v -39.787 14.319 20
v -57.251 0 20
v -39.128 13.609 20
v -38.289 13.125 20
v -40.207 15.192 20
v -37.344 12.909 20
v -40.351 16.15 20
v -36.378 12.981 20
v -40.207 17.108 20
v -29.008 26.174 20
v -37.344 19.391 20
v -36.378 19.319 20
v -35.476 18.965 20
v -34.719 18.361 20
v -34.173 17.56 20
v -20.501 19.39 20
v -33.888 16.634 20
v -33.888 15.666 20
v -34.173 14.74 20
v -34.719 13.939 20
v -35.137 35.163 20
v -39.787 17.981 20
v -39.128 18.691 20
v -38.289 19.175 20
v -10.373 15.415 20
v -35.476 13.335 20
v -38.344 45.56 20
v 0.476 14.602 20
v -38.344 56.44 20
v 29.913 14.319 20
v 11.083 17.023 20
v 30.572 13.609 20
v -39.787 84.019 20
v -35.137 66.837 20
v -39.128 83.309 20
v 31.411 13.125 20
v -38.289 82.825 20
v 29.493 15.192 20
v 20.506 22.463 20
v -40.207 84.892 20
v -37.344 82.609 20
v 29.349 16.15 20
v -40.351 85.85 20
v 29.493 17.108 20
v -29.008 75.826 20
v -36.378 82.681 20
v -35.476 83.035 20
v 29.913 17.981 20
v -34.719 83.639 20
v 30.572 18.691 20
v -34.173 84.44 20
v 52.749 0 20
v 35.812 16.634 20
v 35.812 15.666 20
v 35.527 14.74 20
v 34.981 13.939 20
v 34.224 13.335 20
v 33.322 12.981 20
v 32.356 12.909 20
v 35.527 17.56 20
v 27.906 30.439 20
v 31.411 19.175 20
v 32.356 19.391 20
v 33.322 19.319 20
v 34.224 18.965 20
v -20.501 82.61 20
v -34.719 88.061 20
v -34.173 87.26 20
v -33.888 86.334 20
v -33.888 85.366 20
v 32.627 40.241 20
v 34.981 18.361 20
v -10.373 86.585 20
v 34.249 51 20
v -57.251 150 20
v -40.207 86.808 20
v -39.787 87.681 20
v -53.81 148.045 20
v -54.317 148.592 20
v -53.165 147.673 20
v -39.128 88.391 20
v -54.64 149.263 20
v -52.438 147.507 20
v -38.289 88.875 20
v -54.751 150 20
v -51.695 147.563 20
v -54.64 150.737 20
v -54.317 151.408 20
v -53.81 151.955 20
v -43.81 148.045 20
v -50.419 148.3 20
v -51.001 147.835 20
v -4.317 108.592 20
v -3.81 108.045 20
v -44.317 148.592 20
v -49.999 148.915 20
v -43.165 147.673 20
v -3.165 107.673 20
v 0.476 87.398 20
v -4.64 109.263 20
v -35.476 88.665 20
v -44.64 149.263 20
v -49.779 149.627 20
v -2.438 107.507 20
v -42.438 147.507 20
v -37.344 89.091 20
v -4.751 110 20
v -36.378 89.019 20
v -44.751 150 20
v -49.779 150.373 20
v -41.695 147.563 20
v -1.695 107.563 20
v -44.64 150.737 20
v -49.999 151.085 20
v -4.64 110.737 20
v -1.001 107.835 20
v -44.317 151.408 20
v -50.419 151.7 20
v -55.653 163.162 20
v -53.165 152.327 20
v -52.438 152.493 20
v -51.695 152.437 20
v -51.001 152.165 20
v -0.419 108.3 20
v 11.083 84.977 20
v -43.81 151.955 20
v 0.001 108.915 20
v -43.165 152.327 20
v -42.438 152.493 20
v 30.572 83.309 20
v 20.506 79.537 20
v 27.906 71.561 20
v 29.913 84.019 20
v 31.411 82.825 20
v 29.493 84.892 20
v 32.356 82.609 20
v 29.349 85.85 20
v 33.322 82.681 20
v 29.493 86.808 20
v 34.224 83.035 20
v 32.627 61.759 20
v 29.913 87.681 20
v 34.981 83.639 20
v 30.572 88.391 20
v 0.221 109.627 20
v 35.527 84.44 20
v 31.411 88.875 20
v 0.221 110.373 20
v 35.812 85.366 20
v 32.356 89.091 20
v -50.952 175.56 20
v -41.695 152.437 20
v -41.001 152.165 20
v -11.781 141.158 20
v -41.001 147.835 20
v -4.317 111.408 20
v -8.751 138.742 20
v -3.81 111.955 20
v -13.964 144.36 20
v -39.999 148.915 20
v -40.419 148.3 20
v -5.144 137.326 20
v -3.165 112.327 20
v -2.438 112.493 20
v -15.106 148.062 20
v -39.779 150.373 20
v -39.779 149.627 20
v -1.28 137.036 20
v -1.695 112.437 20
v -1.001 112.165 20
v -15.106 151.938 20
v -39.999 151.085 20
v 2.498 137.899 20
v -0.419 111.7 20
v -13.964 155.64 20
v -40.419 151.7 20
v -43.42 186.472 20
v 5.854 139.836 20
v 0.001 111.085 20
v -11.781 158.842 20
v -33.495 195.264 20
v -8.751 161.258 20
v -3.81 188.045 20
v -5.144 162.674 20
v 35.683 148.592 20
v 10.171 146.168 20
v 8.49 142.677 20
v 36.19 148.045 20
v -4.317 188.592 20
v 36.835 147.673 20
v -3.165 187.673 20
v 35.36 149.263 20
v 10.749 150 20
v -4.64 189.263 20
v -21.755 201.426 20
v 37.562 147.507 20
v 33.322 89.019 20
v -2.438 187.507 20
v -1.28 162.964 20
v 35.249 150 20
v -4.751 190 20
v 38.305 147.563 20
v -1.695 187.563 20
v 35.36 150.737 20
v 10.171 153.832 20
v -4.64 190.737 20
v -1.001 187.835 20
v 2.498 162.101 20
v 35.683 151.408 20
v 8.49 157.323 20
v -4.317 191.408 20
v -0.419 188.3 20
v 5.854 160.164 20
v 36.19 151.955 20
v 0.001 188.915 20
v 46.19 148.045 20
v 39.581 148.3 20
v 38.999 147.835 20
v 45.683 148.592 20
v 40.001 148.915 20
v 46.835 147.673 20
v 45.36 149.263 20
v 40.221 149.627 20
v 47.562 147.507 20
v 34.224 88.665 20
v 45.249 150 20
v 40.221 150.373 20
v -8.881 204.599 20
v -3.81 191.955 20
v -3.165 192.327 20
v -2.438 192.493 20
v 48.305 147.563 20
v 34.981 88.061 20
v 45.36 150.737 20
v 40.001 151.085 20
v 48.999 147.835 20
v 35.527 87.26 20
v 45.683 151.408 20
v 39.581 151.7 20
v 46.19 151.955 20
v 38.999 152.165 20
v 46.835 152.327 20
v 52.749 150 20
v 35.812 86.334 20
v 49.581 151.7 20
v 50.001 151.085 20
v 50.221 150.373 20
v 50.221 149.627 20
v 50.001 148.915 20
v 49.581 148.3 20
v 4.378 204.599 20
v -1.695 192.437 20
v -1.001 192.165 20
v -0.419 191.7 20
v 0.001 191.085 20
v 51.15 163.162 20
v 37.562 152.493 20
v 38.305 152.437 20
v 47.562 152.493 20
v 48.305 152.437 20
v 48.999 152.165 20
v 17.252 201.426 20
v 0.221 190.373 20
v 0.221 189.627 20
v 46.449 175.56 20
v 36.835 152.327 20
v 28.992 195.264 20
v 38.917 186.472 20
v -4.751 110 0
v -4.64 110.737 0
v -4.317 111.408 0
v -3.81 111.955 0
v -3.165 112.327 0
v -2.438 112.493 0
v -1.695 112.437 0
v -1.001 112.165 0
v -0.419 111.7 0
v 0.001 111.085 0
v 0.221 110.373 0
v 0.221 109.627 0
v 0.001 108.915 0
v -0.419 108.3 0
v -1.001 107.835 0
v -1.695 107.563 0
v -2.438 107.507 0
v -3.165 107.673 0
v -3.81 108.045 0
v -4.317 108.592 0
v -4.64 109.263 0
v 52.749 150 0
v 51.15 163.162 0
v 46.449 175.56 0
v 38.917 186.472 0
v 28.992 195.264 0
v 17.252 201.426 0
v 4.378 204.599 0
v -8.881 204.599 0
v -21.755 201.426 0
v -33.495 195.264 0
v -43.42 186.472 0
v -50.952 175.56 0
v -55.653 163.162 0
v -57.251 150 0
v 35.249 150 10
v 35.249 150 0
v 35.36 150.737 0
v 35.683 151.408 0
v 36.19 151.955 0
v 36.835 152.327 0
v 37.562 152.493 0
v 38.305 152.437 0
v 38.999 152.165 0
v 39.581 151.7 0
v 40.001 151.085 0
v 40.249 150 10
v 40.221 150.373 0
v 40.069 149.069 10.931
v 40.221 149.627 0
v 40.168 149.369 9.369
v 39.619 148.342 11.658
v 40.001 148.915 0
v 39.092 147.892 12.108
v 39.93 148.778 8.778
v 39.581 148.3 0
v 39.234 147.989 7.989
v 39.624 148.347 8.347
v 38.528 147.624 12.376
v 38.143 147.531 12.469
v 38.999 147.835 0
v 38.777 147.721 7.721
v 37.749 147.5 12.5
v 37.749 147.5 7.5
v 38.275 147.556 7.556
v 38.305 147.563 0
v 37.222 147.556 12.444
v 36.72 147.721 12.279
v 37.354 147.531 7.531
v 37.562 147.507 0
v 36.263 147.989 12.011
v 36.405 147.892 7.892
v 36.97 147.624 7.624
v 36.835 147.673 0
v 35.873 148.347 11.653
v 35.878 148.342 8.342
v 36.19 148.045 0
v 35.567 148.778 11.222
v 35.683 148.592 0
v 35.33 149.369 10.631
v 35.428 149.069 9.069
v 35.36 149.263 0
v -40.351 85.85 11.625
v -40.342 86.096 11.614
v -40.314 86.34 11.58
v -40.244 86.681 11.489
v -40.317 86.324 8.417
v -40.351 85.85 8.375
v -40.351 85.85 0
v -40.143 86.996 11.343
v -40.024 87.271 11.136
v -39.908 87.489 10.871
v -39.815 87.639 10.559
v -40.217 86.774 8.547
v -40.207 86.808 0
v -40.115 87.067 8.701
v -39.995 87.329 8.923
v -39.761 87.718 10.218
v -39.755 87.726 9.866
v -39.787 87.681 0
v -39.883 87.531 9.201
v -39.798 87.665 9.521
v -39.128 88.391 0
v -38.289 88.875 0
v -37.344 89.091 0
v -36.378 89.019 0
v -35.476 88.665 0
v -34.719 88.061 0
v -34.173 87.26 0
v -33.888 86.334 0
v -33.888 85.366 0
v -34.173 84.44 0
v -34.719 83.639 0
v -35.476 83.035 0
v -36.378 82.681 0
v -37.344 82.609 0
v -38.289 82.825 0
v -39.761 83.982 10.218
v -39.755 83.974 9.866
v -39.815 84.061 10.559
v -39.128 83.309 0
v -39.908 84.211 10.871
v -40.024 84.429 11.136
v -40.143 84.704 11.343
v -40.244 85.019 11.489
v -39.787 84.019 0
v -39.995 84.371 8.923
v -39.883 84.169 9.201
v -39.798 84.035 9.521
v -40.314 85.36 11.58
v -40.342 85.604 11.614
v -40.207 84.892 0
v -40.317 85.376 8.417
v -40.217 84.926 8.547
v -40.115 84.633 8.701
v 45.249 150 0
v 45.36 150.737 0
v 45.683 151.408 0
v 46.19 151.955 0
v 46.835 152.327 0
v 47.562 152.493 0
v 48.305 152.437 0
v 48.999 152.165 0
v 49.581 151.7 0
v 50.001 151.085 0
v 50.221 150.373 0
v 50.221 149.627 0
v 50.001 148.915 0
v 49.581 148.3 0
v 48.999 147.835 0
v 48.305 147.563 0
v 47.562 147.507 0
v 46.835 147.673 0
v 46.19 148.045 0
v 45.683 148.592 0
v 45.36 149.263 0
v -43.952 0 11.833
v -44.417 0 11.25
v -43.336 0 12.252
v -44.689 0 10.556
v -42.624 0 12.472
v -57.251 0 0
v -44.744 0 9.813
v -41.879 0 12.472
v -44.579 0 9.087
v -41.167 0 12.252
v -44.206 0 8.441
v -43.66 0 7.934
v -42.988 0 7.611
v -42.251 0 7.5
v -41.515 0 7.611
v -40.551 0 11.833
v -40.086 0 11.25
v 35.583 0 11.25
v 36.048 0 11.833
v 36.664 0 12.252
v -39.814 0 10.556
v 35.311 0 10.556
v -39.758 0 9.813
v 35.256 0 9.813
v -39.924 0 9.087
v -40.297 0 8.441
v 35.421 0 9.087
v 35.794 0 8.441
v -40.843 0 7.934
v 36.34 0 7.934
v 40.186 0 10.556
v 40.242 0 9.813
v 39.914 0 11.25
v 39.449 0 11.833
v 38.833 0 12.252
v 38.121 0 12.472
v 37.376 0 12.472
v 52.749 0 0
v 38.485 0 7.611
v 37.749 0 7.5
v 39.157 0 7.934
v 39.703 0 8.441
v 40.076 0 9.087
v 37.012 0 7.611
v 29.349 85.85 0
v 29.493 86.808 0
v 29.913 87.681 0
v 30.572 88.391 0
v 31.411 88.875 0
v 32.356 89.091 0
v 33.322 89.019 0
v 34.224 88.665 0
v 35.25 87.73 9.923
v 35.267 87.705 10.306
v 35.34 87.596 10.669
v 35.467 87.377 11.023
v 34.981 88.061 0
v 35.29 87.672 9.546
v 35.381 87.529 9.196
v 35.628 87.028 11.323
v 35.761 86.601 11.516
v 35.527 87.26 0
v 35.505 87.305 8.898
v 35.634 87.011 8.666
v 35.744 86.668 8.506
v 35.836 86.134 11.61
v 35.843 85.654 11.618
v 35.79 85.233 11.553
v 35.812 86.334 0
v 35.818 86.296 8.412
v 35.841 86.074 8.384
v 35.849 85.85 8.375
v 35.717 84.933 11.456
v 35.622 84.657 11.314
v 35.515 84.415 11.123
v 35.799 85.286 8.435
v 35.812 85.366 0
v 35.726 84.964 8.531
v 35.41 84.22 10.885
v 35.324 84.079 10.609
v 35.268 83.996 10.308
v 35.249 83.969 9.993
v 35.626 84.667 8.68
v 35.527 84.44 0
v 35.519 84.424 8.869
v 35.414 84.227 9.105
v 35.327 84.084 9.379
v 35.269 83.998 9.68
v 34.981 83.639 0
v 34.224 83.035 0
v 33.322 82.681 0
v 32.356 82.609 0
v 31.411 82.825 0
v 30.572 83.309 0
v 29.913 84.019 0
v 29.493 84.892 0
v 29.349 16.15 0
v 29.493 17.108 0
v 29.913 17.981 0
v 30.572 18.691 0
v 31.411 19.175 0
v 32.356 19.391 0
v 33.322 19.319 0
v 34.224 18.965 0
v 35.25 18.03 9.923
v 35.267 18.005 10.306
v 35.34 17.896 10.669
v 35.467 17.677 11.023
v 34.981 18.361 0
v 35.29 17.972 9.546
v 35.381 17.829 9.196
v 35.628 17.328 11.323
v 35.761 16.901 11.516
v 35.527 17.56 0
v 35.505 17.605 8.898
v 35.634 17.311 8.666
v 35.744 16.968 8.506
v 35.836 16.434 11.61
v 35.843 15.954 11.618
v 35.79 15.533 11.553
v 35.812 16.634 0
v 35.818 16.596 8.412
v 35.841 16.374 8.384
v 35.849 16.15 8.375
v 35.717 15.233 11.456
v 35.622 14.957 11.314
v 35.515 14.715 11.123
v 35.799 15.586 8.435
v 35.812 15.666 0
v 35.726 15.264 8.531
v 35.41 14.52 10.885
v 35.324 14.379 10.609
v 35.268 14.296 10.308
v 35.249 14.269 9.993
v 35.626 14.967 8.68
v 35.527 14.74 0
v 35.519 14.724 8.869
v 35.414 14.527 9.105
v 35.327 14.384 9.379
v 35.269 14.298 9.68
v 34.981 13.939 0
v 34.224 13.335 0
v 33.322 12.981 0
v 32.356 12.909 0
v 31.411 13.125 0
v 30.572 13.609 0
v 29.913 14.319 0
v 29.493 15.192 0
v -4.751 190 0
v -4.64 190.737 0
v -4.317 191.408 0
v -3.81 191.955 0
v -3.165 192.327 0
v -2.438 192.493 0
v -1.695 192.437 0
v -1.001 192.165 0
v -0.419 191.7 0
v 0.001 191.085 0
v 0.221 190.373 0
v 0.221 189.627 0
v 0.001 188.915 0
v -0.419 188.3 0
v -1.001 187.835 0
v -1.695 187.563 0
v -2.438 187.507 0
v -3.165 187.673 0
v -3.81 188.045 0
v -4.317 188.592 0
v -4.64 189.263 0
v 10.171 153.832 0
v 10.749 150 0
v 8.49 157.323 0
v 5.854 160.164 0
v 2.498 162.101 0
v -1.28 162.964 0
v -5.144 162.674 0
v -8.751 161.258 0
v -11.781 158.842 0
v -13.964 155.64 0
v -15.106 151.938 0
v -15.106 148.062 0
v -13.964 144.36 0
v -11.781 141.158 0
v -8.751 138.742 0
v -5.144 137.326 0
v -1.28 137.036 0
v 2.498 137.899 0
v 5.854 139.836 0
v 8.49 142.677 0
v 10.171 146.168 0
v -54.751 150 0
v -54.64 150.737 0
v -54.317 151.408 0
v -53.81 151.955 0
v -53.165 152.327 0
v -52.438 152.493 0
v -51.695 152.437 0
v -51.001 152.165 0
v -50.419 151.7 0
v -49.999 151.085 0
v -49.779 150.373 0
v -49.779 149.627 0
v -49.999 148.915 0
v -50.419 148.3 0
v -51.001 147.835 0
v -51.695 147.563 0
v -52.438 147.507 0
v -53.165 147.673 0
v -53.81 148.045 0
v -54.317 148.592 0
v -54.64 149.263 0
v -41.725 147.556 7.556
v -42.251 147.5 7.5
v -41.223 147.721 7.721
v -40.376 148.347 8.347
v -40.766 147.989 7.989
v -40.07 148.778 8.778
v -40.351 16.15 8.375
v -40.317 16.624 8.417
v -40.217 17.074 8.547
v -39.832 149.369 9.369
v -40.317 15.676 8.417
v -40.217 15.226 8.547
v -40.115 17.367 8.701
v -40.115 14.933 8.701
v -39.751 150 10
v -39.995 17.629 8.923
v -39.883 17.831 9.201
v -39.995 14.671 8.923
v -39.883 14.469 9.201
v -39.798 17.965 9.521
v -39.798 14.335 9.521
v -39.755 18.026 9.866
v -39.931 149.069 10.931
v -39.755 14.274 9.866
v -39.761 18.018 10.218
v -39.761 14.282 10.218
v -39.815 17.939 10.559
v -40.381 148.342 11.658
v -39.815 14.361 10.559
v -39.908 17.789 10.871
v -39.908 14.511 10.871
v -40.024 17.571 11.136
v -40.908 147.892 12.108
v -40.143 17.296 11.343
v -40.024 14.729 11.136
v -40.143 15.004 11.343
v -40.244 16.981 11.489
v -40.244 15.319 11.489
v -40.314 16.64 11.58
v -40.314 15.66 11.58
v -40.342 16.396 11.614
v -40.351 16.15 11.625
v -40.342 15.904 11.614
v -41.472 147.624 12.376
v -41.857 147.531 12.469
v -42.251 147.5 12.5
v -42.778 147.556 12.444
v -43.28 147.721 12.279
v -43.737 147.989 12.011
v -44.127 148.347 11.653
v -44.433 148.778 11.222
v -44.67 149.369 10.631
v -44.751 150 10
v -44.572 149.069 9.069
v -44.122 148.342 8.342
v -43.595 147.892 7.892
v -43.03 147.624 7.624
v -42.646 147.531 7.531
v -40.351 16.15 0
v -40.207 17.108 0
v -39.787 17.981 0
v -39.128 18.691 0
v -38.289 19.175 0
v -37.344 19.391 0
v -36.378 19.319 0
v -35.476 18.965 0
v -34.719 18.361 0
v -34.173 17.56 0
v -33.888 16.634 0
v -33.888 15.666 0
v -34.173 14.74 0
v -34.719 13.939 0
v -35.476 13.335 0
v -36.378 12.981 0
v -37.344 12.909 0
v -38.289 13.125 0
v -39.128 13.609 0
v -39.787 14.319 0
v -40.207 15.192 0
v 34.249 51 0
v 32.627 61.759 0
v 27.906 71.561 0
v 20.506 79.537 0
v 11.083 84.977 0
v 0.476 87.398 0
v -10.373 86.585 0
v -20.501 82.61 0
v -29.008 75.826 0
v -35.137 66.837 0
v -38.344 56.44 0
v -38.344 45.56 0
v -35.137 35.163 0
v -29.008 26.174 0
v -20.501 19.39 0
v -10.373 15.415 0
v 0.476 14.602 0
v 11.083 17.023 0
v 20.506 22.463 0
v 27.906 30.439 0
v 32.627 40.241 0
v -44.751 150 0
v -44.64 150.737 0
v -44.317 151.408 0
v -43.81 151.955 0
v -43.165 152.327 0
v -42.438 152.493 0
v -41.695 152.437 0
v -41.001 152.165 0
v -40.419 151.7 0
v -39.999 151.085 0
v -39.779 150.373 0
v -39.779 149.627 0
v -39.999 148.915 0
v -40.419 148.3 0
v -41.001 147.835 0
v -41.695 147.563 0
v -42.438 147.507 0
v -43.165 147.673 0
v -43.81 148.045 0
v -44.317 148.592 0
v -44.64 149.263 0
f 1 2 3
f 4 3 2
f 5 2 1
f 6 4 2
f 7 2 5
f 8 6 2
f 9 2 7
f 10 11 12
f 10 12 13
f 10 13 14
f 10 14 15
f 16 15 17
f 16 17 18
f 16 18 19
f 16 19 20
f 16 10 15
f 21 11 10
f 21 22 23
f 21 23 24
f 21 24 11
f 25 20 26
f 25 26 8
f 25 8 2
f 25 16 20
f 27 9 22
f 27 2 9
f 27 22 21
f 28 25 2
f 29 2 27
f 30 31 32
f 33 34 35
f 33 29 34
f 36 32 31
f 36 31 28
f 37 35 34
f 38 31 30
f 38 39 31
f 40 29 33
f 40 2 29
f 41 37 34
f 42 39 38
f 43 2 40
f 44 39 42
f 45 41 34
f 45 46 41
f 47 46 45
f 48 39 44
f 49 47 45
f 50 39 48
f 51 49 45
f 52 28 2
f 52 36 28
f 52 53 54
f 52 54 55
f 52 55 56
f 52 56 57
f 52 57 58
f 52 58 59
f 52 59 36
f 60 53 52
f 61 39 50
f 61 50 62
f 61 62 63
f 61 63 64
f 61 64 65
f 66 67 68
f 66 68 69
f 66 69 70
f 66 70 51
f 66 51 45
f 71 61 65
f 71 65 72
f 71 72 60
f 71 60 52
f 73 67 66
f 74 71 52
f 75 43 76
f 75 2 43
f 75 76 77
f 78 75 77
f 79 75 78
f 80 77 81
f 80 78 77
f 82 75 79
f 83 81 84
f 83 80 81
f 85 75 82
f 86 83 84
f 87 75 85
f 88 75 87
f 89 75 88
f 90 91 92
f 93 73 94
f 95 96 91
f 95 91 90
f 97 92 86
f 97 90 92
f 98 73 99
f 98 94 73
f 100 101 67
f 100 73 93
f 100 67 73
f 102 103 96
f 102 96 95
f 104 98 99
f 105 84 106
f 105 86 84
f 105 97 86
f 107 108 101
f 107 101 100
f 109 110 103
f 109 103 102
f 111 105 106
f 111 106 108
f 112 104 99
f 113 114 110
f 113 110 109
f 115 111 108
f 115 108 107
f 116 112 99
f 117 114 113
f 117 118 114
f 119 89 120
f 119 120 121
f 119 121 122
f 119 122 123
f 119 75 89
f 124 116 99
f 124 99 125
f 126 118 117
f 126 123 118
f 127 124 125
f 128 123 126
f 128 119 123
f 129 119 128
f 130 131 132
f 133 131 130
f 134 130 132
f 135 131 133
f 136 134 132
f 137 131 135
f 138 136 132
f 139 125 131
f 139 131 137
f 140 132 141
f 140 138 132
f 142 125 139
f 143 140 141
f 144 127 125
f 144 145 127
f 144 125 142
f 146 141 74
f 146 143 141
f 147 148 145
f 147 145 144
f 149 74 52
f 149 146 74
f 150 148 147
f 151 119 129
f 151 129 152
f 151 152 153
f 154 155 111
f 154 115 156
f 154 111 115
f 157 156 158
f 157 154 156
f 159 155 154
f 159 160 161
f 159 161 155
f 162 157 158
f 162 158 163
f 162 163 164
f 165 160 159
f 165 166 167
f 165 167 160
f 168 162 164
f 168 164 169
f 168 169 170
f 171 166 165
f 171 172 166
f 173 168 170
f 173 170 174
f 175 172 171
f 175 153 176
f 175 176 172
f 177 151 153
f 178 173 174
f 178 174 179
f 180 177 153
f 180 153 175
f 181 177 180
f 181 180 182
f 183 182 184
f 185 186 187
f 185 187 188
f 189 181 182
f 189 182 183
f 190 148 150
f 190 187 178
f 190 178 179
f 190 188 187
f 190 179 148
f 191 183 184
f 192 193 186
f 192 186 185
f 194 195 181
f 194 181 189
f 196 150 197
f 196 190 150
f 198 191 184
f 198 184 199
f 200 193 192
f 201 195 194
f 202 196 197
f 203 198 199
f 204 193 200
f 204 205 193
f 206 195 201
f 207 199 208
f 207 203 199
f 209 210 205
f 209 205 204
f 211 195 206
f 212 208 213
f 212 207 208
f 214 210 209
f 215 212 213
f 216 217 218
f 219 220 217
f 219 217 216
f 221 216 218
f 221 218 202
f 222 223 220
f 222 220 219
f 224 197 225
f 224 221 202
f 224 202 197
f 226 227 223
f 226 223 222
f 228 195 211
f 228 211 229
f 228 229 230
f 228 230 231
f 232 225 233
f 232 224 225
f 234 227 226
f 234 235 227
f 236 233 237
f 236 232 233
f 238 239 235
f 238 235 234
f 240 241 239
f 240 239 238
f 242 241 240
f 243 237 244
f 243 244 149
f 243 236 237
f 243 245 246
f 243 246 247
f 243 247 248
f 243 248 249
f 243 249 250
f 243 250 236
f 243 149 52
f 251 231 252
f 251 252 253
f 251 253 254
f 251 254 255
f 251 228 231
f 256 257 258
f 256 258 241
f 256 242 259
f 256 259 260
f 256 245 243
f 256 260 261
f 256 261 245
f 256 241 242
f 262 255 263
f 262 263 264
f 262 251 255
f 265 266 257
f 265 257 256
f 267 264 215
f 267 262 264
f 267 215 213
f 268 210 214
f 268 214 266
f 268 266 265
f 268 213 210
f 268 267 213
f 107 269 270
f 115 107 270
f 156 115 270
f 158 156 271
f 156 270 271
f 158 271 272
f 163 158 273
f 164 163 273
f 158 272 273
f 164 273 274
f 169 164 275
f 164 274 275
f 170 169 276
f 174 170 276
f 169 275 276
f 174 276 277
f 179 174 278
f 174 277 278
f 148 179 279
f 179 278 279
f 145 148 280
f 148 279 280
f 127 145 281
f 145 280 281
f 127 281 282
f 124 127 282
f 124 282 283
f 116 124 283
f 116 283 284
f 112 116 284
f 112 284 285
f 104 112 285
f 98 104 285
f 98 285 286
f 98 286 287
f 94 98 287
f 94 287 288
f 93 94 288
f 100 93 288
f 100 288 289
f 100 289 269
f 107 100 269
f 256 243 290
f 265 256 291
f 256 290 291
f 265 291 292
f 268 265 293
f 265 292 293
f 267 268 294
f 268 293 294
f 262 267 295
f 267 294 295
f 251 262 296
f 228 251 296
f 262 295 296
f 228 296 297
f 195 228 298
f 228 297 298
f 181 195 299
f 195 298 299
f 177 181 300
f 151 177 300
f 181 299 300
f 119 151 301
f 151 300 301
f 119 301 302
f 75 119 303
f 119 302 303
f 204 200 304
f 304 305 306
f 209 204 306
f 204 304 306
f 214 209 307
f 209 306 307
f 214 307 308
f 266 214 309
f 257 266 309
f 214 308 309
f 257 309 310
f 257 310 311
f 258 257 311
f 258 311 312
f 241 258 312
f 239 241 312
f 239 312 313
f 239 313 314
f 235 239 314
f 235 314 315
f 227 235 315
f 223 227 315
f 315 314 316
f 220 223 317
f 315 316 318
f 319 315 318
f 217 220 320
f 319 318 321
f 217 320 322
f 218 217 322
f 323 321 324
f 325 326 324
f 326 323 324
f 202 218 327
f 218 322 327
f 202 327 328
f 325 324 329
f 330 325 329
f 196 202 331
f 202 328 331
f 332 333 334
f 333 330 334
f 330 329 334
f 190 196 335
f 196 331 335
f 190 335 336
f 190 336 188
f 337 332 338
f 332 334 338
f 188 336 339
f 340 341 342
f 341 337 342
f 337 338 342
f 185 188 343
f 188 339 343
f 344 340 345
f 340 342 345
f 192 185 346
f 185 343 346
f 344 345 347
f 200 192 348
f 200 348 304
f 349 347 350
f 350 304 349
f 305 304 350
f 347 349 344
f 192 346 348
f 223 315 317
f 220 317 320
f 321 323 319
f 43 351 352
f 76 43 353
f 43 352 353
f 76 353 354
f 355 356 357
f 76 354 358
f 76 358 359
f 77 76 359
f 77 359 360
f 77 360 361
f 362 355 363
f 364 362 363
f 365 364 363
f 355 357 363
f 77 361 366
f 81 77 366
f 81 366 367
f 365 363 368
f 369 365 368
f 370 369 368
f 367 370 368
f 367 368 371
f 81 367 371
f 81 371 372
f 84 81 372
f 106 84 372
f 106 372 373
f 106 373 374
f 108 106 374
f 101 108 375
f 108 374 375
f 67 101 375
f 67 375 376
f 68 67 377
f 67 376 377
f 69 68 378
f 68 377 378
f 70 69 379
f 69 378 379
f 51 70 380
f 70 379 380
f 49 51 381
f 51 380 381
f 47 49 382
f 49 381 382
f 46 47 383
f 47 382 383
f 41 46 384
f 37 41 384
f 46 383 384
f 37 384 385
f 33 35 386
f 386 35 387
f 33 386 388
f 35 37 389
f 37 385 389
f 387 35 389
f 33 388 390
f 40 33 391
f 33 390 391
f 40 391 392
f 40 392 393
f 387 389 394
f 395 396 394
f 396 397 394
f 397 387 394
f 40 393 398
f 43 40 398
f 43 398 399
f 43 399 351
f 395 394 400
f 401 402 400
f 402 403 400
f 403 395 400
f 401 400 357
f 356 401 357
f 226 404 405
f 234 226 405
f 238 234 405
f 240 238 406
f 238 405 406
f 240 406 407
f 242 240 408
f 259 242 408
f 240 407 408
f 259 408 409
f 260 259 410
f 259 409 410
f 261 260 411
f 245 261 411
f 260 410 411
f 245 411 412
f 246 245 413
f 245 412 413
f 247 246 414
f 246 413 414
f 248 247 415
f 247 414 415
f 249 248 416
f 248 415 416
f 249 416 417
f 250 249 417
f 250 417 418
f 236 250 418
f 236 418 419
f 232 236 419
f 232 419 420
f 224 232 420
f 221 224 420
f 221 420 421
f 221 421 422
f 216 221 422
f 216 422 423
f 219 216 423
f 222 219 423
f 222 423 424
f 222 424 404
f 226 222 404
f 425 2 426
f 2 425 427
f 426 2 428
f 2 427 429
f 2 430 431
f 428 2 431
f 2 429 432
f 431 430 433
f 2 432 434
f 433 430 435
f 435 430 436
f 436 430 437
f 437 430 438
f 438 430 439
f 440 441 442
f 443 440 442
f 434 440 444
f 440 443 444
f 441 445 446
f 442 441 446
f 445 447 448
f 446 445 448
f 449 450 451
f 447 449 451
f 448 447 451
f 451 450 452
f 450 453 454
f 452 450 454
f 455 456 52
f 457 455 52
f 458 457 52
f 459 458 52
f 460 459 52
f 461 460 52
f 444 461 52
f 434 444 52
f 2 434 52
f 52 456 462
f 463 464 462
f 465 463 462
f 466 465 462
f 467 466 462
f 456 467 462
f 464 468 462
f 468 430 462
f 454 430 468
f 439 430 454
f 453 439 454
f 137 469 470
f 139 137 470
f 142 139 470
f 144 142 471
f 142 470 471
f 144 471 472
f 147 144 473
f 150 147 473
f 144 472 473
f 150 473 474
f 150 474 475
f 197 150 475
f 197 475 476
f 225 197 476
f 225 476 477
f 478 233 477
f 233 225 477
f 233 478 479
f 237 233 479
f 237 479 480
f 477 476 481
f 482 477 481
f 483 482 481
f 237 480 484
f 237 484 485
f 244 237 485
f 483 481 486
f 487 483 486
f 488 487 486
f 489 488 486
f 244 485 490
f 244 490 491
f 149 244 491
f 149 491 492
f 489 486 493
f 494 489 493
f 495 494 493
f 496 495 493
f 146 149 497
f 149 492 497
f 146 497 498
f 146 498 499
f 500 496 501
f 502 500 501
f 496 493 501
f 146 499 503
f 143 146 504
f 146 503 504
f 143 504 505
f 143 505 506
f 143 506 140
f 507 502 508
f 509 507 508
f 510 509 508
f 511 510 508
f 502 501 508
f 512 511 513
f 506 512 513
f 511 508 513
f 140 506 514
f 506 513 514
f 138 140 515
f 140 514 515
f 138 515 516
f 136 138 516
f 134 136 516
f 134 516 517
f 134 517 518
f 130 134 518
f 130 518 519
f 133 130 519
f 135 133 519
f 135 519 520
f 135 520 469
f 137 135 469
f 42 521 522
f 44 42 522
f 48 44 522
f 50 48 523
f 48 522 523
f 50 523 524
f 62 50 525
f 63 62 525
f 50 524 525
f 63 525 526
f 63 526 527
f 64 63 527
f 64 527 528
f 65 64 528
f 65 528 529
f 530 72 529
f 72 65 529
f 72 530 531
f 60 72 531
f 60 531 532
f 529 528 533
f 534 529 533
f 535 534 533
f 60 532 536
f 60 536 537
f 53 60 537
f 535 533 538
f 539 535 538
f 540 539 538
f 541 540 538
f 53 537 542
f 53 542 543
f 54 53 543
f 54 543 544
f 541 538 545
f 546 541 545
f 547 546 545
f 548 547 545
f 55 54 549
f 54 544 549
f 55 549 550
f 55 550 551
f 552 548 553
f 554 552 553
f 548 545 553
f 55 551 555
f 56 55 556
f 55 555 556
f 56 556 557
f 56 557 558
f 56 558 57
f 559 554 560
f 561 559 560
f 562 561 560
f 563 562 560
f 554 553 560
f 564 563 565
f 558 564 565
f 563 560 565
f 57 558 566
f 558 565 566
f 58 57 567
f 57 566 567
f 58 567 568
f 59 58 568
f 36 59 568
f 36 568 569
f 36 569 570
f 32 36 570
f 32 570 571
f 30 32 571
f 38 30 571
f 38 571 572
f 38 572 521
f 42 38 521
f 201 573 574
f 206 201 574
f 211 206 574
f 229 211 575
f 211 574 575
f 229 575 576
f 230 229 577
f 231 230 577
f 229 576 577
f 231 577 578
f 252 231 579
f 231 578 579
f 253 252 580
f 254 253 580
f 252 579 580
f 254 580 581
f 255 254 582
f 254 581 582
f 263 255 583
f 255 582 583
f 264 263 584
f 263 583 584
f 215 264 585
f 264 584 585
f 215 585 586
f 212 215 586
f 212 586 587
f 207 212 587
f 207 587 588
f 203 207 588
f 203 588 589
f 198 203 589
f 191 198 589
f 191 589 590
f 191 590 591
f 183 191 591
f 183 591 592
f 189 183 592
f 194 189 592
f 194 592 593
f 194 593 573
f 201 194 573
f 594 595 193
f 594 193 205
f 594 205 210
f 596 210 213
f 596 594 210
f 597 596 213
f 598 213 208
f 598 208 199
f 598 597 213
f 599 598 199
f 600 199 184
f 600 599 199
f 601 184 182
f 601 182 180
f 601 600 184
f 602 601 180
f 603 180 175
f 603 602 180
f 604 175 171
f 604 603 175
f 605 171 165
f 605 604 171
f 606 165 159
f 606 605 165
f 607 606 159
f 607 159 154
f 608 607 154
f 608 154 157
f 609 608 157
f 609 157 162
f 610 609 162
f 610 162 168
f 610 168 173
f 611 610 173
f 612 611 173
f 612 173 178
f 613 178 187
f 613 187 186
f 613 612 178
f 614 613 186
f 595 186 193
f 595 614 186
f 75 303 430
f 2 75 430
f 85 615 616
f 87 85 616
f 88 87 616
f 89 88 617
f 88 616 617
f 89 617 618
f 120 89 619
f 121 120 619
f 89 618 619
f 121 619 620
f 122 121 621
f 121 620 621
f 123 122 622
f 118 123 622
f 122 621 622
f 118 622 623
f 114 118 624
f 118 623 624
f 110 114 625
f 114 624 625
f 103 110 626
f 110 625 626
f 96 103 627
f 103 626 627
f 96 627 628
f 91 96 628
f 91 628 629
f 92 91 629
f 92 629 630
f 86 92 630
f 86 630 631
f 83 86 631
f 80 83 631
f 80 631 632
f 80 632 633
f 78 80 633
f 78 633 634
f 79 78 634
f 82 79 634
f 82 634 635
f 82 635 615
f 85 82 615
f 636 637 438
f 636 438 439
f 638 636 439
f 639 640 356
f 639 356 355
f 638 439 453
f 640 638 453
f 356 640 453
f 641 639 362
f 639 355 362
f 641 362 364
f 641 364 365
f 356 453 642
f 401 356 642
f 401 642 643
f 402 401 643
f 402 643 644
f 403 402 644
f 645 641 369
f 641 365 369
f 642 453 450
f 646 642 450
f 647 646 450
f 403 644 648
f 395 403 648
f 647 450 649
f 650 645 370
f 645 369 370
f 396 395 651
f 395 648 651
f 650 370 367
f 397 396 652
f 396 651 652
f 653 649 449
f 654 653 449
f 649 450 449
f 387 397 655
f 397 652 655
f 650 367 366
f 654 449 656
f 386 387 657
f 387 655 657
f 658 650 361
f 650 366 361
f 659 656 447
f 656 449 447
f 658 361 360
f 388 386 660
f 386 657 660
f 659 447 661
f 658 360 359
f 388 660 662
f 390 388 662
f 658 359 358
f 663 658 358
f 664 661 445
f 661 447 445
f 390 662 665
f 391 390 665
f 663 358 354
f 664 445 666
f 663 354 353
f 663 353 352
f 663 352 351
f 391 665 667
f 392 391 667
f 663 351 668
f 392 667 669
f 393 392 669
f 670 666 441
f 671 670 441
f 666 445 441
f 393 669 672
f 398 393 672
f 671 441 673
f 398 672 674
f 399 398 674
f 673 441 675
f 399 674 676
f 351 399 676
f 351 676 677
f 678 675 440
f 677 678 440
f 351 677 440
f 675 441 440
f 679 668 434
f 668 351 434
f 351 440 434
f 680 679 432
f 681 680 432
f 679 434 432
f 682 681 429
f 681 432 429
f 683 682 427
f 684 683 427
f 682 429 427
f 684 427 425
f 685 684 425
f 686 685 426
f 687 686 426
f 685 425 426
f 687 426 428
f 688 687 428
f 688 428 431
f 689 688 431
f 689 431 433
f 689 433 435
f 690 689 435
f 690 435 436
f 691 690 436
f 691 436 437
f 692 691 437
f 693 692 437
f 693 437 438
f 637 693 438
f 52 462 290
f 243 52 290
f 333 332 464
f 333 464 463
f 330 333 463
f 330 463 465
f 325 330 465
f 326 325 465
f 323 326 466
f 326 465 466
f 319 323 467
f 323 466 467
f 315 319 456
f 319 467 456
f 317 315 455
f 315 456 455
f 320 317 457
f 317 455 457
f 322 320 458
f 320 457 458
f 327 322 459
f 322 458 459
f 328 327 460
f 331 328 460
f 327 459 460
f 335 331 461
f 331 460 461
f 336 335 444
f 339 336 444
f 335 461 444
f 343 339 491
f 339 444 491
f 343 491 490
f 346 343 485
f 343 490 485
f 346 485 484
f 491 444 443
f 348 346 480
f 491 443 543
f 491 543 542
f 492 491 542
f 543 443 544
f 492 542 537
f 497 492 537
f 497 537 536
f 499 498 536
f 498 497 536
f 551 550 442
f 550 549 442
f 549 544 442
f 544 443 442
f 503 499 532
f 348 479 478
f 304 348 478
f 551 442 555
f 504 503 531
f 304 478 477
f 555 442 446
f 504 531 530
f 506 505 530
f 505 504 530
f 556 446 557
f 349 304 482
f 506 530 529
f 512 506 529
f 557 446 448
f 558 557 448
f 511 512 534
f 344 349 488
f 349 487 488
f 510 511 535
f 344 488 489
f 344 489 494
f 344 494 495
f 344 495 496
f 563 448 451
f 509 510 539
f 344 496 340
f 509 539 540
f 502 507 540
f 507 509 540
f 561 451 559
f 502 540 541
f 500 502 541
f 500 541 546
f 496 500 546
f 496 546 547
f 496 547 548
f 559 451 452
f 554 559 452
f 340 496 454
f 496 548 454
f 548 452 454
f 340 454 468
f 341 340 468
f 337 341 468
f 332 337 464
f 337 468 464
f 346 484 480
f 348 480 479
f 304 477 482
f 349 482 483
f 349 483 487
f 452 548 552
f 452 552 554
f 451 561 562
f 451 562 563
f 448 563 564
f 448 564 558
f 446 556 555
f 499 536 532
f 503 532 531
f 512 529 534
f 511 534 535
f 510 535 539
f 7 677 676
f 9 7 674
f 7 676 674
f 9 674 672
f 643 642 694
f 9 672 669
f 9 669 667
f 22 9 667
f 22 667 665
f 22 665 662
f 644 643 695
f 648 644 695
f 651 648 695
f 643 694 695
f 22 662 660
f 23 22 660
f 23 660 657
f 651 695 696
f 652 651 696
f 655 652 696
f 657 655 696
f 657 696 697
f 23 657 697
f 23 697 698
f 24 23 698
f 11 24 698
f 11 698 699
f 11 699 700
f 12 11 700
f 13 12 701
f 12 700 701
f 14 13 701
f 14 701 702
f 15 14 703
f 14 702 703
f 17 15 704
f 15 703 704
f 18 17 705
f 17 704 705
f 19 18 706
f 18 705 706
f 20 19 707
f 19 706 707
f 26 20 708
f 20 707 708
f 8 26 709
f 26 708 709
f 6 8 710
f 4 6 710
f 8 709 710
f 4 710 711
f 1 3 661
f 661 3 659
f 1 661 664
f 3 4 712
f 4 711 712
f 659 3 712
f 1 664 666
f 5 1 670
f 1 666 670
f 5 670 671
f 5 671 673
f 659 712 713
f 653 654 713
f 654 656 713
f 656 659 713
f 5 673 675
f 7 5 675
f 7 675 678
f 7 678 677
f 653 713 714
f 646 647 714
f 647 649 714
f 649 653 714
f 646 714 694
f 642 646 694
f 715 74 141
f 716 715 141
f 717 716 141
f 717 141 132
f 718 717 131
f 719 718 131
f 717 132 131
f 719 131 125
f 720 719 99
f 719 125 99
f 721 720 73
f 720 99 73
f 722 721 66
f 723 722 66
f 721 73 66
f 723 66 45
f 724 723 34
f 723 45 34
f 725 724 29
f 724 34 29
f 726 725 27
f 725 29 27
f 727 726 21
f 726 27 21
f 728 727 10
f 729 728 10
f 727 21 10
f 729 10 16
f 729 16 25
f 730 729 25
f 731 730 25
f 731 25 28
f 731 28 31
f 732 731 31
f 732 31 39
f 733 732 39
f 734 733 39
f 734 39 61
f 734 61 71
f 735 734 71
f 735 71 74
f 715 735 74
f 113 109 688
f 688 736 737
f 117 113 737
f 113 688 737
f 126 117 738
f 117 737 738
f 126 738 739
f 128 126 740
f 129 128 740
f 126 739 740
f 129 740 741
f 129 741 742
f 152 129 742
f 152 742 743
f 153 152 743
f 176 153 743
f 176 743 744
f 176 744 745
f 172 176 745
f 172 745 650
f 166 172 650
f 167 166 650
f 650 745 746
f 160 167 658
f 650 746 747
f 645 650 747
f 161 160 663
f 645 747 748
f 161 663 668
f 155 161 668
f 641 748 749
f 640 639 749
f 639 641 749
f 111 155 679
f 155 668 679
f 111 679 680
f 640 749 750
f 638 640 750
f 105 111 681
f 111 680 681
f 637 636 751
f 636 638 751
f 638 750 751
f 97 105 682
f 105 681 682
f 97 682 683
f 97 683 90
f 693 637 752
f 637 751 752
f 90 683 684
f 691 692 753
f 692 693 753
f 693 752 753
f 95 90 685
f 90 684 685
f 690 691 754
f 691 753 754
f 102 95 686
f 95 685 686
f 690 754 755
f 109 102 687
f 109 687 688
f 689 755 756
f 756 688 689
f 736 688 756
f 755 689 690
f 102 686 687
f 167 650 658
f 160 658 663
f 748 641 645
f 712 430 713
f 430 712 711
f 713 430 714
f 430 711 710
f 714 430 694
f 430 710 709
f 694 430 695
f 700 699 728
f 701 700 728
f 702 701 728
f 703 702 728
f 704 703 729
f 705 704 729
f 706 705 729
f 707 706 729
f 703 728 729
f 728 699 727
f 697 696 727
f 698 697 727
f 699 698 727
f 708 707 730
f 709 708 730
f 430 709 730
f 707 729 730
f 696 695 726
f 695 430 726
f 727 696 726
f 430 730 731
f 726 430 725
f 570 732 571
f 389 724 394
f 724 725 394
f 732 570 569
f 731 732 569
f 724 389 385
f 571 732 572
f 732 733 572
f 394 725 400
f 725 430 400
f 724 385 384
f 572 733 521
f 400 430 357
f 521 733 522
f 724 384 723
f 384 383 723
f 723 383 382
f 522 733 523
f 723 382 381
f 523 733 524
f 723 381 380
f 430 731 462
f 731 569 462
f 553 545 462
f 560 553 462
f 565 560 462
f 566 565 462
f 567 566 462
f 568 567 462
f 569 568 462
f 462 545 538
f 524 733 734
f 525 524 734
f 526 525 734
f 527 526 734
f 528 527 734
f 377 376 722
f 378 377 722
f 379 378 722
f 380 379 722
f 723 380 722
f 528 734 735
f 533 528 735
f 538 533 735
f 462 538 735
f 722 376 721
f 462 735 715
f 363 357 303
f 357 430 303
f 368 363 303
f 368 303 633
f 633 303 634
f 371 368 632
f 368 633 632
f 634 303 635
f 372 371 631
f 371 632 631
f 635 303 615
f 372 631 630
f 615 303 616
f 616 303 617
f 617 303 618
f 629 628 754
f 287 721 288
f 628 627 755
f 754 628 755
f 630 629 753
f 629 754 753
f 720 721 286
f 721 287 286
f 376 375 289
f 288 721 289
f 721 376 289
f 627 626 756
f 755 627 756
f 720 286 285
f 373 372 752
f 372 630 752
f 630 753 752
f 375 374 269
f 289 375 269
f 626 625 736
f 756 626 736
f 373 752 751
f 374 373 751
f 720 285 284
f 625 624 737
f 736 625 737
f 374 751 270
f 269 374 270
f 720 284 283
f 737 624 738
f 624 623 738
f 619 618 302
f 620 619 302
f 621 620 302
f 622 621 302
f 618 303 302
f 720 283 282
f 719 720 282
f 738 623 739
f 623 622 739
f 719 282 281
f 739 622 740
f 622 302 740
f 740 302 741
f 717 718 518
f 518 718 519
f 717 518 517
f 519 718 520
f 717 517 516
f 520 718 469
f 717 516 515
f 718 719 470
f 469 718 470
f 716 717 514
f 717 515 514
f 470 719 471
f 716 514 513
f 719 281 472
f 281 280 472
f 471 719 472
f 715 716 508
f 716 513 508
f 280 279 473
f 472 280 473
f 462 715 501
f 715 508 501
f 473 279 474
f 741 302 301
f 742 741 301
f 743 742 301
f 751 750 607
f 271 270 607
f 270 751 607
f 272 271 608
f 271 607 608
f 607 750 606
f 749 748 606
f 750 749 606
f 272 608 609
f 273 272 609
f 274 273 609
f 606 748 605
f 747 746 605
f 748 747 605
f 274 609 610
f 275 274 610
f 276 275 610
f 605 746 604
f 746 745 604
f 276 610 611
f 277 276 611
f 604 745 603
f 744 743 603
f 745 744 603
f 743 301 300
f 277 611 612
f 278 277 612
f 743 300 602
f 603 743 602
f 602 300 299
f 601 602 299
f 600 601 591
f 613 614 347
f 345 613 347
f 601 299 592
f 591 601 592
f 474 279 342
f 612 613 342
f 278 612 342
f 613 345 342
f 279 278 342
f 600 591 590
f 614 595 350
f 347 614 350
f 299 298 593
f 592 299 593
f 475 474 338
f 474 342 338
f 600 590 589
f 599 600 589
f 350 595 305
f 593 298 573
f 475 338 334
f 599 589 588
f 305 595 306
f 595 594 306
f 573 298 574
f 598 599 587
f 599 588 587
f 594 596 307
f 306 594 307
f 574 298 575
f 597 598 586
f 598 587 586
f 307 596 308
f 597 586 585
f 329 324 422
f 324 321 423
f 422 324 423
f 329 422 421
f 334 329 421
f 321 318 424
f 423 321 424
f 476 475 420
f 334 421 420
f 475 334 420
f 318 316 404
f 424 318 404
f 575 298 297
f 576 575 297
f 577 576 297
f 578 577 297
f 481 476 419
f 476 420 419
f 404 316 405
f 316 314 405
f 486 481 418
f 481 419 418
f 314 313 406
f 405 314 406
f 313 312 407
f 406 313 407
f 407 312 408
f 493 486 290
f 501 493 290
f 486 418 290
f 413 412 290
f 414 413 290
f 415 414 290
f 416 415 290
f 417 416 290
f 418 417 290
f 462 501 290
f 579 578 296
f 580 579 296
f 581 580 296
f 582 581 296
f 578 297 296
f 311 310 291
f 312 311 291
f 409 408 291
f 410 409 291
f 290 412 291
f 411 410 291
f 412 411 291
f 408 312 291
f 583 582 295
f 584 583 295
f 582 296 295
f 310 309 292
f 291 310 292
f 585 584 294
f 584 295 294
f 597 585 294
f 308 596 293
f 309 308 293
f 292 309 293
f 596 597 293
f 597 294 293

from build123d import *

# Parameters (mm, degrees)
SKETCH1_R                  = 13
BOSS_EXTRUDE1_DEPTH        = 20
F_5_0MM_DOWEL_HOLE1_D      = 5
F_5_0MM_DOWEL_HOLE2_REACH  = 228.164
F_5_0MM_DOWEL_HOLE2_BORE_R = 2.5
F_5_0MM_DOWEL_HOLE3_D      = 5
SKETCH9_R                  = 36.5
CUT_EXTRUDE1_DEPTH         = 214.781968135
F_6_0MM_DOWEL_HOLE1_D      = 6.5


with BuildPart() as part:
    # Sketch1 → Boss-Extrude1 (new body)
    with BuildSketch(Plane.XY):
        with BuildLine():
            Line((-57.251461988, 0), (52.748538012, 0))
            Line((52.748538012, 0), (52.748538012, 150))
            ThreePointArc((52.748538012, 150), (-2.251461988, 205), (-57.251461988, 150))
            Line((-57.251461988, 150), (-57.251461988, 0))
        make_face()
        with Locations((-2.251461988, 150)):
            Circle(SKETCH1_R, mode=Mode.SUBTRACT)
    extrude(amount=BOSS_EXTRUDE1_DEPTH)

    # Ø5.0mm Dowel Hole1 (through all)
    with Locations(Plane(origin=(-2.251461988, 190, 20), x_dir=(1, 0, 0), z_dir=(0, 0, 1))):
        with Locations((0, 0), (40, -40), (0, -80), (-40, -40)):
            Hole(F_5_0MM_DOWEL_HOLE1_D / 2)

    # Ø5.0mm Dowel Hole2 bore (on position points) → Ø5.0mm Dowel Hole2 (cut, up to next)
    with BuildSketch(Plane(origin=(-42.251461988, 0, 10), x_dir=(0, 0, -1), z_dir=(0, -1, 0)), mode=Mode.PRIVATE) as f_5_0mm_dowel_hole2_sk1:
        Circle(F_5_0MM_DOWEL_HOLE2_BORE_R)
    f_5_0mm_dowel_hole2_tool1 = extrude(f_5_0mm_dowel_hole2_sk1.sketch, amount=-F_5_0MM_DOWEL_HOLE2_REACH, mode=Mode.PRIVATE) & part.part
    # Ø5.0mm Dowel Hole2 bore (on position points) → Ø5.0mm Dowel Hole2 (cut, up to next)
    with BuildSketch(Plane(origin=(-42.251461988, 0, 10), x_dir=(0, 0, -1), z_dir=(0, -1, 0)), mode=Mode.PRIVATE) as f_5_0mm_dowel_hole2_sk2:
        with Locations((0, 80)):
            Circle(F_5_0MM_DOWEL_HOLE2_BORE_R)
    f_5_0mm_dowel_hole2_tool2 = extrude(f_5_0mm_dowel_hole2_sk2.sketch, amount=-F_5_0MM_DOWEL_HOLE2_REACH, mode=Mode.PRIVATE) & part.part
    add(f_5_0mm_dowel_hole2_tool1.solids().sort_by_distance((-42.251462, 0, 10))[0], mode=Mode.SUBTRACT)
    add(f_5_0mm_dowel_hole2_tool2.solids().sort_by_distance((37.748538, 0, 10))[0], mode=Mode.SUBTRACT)

    # Ø5.0mm Dowel Hole3 (through all)
    with Locations(Plane(origin=(-52.251461988, 150, 20), x_dir=(1, 0, 0), z_dir=(0, 0, 1))):
        with Locations((0, 0), (100, 0)):
            Hole(F_5_0MM_DOWEL_HOLE3_D / 2)

    # Sketch9 → Cut-Extrude1 (cut, through all)
    with BuildSketch(Plane.XY.offset(20)):
        with Locations((-2.251461988, 51)):
            Circle(SKETCH9_R)
    extrude(amount=-CUT_EXTRUDE1_DEPTH, mode=Mode.SUBTRACT)

    # Ø6.0mm Dowel Hole1 (through all)
    with Locations(Plane(origin=(-37.101461988, 85.85, 20), x_dir=(1, 0, 0), z_dir=(0, 0, 1))):
        with Locations((0, 0), (69.7, 0), (69.7, -69.7), (0, -69.7)):
            Hole(F_6_0MM_DOWEL_HOLE1_D / 2)


solid = part.part
